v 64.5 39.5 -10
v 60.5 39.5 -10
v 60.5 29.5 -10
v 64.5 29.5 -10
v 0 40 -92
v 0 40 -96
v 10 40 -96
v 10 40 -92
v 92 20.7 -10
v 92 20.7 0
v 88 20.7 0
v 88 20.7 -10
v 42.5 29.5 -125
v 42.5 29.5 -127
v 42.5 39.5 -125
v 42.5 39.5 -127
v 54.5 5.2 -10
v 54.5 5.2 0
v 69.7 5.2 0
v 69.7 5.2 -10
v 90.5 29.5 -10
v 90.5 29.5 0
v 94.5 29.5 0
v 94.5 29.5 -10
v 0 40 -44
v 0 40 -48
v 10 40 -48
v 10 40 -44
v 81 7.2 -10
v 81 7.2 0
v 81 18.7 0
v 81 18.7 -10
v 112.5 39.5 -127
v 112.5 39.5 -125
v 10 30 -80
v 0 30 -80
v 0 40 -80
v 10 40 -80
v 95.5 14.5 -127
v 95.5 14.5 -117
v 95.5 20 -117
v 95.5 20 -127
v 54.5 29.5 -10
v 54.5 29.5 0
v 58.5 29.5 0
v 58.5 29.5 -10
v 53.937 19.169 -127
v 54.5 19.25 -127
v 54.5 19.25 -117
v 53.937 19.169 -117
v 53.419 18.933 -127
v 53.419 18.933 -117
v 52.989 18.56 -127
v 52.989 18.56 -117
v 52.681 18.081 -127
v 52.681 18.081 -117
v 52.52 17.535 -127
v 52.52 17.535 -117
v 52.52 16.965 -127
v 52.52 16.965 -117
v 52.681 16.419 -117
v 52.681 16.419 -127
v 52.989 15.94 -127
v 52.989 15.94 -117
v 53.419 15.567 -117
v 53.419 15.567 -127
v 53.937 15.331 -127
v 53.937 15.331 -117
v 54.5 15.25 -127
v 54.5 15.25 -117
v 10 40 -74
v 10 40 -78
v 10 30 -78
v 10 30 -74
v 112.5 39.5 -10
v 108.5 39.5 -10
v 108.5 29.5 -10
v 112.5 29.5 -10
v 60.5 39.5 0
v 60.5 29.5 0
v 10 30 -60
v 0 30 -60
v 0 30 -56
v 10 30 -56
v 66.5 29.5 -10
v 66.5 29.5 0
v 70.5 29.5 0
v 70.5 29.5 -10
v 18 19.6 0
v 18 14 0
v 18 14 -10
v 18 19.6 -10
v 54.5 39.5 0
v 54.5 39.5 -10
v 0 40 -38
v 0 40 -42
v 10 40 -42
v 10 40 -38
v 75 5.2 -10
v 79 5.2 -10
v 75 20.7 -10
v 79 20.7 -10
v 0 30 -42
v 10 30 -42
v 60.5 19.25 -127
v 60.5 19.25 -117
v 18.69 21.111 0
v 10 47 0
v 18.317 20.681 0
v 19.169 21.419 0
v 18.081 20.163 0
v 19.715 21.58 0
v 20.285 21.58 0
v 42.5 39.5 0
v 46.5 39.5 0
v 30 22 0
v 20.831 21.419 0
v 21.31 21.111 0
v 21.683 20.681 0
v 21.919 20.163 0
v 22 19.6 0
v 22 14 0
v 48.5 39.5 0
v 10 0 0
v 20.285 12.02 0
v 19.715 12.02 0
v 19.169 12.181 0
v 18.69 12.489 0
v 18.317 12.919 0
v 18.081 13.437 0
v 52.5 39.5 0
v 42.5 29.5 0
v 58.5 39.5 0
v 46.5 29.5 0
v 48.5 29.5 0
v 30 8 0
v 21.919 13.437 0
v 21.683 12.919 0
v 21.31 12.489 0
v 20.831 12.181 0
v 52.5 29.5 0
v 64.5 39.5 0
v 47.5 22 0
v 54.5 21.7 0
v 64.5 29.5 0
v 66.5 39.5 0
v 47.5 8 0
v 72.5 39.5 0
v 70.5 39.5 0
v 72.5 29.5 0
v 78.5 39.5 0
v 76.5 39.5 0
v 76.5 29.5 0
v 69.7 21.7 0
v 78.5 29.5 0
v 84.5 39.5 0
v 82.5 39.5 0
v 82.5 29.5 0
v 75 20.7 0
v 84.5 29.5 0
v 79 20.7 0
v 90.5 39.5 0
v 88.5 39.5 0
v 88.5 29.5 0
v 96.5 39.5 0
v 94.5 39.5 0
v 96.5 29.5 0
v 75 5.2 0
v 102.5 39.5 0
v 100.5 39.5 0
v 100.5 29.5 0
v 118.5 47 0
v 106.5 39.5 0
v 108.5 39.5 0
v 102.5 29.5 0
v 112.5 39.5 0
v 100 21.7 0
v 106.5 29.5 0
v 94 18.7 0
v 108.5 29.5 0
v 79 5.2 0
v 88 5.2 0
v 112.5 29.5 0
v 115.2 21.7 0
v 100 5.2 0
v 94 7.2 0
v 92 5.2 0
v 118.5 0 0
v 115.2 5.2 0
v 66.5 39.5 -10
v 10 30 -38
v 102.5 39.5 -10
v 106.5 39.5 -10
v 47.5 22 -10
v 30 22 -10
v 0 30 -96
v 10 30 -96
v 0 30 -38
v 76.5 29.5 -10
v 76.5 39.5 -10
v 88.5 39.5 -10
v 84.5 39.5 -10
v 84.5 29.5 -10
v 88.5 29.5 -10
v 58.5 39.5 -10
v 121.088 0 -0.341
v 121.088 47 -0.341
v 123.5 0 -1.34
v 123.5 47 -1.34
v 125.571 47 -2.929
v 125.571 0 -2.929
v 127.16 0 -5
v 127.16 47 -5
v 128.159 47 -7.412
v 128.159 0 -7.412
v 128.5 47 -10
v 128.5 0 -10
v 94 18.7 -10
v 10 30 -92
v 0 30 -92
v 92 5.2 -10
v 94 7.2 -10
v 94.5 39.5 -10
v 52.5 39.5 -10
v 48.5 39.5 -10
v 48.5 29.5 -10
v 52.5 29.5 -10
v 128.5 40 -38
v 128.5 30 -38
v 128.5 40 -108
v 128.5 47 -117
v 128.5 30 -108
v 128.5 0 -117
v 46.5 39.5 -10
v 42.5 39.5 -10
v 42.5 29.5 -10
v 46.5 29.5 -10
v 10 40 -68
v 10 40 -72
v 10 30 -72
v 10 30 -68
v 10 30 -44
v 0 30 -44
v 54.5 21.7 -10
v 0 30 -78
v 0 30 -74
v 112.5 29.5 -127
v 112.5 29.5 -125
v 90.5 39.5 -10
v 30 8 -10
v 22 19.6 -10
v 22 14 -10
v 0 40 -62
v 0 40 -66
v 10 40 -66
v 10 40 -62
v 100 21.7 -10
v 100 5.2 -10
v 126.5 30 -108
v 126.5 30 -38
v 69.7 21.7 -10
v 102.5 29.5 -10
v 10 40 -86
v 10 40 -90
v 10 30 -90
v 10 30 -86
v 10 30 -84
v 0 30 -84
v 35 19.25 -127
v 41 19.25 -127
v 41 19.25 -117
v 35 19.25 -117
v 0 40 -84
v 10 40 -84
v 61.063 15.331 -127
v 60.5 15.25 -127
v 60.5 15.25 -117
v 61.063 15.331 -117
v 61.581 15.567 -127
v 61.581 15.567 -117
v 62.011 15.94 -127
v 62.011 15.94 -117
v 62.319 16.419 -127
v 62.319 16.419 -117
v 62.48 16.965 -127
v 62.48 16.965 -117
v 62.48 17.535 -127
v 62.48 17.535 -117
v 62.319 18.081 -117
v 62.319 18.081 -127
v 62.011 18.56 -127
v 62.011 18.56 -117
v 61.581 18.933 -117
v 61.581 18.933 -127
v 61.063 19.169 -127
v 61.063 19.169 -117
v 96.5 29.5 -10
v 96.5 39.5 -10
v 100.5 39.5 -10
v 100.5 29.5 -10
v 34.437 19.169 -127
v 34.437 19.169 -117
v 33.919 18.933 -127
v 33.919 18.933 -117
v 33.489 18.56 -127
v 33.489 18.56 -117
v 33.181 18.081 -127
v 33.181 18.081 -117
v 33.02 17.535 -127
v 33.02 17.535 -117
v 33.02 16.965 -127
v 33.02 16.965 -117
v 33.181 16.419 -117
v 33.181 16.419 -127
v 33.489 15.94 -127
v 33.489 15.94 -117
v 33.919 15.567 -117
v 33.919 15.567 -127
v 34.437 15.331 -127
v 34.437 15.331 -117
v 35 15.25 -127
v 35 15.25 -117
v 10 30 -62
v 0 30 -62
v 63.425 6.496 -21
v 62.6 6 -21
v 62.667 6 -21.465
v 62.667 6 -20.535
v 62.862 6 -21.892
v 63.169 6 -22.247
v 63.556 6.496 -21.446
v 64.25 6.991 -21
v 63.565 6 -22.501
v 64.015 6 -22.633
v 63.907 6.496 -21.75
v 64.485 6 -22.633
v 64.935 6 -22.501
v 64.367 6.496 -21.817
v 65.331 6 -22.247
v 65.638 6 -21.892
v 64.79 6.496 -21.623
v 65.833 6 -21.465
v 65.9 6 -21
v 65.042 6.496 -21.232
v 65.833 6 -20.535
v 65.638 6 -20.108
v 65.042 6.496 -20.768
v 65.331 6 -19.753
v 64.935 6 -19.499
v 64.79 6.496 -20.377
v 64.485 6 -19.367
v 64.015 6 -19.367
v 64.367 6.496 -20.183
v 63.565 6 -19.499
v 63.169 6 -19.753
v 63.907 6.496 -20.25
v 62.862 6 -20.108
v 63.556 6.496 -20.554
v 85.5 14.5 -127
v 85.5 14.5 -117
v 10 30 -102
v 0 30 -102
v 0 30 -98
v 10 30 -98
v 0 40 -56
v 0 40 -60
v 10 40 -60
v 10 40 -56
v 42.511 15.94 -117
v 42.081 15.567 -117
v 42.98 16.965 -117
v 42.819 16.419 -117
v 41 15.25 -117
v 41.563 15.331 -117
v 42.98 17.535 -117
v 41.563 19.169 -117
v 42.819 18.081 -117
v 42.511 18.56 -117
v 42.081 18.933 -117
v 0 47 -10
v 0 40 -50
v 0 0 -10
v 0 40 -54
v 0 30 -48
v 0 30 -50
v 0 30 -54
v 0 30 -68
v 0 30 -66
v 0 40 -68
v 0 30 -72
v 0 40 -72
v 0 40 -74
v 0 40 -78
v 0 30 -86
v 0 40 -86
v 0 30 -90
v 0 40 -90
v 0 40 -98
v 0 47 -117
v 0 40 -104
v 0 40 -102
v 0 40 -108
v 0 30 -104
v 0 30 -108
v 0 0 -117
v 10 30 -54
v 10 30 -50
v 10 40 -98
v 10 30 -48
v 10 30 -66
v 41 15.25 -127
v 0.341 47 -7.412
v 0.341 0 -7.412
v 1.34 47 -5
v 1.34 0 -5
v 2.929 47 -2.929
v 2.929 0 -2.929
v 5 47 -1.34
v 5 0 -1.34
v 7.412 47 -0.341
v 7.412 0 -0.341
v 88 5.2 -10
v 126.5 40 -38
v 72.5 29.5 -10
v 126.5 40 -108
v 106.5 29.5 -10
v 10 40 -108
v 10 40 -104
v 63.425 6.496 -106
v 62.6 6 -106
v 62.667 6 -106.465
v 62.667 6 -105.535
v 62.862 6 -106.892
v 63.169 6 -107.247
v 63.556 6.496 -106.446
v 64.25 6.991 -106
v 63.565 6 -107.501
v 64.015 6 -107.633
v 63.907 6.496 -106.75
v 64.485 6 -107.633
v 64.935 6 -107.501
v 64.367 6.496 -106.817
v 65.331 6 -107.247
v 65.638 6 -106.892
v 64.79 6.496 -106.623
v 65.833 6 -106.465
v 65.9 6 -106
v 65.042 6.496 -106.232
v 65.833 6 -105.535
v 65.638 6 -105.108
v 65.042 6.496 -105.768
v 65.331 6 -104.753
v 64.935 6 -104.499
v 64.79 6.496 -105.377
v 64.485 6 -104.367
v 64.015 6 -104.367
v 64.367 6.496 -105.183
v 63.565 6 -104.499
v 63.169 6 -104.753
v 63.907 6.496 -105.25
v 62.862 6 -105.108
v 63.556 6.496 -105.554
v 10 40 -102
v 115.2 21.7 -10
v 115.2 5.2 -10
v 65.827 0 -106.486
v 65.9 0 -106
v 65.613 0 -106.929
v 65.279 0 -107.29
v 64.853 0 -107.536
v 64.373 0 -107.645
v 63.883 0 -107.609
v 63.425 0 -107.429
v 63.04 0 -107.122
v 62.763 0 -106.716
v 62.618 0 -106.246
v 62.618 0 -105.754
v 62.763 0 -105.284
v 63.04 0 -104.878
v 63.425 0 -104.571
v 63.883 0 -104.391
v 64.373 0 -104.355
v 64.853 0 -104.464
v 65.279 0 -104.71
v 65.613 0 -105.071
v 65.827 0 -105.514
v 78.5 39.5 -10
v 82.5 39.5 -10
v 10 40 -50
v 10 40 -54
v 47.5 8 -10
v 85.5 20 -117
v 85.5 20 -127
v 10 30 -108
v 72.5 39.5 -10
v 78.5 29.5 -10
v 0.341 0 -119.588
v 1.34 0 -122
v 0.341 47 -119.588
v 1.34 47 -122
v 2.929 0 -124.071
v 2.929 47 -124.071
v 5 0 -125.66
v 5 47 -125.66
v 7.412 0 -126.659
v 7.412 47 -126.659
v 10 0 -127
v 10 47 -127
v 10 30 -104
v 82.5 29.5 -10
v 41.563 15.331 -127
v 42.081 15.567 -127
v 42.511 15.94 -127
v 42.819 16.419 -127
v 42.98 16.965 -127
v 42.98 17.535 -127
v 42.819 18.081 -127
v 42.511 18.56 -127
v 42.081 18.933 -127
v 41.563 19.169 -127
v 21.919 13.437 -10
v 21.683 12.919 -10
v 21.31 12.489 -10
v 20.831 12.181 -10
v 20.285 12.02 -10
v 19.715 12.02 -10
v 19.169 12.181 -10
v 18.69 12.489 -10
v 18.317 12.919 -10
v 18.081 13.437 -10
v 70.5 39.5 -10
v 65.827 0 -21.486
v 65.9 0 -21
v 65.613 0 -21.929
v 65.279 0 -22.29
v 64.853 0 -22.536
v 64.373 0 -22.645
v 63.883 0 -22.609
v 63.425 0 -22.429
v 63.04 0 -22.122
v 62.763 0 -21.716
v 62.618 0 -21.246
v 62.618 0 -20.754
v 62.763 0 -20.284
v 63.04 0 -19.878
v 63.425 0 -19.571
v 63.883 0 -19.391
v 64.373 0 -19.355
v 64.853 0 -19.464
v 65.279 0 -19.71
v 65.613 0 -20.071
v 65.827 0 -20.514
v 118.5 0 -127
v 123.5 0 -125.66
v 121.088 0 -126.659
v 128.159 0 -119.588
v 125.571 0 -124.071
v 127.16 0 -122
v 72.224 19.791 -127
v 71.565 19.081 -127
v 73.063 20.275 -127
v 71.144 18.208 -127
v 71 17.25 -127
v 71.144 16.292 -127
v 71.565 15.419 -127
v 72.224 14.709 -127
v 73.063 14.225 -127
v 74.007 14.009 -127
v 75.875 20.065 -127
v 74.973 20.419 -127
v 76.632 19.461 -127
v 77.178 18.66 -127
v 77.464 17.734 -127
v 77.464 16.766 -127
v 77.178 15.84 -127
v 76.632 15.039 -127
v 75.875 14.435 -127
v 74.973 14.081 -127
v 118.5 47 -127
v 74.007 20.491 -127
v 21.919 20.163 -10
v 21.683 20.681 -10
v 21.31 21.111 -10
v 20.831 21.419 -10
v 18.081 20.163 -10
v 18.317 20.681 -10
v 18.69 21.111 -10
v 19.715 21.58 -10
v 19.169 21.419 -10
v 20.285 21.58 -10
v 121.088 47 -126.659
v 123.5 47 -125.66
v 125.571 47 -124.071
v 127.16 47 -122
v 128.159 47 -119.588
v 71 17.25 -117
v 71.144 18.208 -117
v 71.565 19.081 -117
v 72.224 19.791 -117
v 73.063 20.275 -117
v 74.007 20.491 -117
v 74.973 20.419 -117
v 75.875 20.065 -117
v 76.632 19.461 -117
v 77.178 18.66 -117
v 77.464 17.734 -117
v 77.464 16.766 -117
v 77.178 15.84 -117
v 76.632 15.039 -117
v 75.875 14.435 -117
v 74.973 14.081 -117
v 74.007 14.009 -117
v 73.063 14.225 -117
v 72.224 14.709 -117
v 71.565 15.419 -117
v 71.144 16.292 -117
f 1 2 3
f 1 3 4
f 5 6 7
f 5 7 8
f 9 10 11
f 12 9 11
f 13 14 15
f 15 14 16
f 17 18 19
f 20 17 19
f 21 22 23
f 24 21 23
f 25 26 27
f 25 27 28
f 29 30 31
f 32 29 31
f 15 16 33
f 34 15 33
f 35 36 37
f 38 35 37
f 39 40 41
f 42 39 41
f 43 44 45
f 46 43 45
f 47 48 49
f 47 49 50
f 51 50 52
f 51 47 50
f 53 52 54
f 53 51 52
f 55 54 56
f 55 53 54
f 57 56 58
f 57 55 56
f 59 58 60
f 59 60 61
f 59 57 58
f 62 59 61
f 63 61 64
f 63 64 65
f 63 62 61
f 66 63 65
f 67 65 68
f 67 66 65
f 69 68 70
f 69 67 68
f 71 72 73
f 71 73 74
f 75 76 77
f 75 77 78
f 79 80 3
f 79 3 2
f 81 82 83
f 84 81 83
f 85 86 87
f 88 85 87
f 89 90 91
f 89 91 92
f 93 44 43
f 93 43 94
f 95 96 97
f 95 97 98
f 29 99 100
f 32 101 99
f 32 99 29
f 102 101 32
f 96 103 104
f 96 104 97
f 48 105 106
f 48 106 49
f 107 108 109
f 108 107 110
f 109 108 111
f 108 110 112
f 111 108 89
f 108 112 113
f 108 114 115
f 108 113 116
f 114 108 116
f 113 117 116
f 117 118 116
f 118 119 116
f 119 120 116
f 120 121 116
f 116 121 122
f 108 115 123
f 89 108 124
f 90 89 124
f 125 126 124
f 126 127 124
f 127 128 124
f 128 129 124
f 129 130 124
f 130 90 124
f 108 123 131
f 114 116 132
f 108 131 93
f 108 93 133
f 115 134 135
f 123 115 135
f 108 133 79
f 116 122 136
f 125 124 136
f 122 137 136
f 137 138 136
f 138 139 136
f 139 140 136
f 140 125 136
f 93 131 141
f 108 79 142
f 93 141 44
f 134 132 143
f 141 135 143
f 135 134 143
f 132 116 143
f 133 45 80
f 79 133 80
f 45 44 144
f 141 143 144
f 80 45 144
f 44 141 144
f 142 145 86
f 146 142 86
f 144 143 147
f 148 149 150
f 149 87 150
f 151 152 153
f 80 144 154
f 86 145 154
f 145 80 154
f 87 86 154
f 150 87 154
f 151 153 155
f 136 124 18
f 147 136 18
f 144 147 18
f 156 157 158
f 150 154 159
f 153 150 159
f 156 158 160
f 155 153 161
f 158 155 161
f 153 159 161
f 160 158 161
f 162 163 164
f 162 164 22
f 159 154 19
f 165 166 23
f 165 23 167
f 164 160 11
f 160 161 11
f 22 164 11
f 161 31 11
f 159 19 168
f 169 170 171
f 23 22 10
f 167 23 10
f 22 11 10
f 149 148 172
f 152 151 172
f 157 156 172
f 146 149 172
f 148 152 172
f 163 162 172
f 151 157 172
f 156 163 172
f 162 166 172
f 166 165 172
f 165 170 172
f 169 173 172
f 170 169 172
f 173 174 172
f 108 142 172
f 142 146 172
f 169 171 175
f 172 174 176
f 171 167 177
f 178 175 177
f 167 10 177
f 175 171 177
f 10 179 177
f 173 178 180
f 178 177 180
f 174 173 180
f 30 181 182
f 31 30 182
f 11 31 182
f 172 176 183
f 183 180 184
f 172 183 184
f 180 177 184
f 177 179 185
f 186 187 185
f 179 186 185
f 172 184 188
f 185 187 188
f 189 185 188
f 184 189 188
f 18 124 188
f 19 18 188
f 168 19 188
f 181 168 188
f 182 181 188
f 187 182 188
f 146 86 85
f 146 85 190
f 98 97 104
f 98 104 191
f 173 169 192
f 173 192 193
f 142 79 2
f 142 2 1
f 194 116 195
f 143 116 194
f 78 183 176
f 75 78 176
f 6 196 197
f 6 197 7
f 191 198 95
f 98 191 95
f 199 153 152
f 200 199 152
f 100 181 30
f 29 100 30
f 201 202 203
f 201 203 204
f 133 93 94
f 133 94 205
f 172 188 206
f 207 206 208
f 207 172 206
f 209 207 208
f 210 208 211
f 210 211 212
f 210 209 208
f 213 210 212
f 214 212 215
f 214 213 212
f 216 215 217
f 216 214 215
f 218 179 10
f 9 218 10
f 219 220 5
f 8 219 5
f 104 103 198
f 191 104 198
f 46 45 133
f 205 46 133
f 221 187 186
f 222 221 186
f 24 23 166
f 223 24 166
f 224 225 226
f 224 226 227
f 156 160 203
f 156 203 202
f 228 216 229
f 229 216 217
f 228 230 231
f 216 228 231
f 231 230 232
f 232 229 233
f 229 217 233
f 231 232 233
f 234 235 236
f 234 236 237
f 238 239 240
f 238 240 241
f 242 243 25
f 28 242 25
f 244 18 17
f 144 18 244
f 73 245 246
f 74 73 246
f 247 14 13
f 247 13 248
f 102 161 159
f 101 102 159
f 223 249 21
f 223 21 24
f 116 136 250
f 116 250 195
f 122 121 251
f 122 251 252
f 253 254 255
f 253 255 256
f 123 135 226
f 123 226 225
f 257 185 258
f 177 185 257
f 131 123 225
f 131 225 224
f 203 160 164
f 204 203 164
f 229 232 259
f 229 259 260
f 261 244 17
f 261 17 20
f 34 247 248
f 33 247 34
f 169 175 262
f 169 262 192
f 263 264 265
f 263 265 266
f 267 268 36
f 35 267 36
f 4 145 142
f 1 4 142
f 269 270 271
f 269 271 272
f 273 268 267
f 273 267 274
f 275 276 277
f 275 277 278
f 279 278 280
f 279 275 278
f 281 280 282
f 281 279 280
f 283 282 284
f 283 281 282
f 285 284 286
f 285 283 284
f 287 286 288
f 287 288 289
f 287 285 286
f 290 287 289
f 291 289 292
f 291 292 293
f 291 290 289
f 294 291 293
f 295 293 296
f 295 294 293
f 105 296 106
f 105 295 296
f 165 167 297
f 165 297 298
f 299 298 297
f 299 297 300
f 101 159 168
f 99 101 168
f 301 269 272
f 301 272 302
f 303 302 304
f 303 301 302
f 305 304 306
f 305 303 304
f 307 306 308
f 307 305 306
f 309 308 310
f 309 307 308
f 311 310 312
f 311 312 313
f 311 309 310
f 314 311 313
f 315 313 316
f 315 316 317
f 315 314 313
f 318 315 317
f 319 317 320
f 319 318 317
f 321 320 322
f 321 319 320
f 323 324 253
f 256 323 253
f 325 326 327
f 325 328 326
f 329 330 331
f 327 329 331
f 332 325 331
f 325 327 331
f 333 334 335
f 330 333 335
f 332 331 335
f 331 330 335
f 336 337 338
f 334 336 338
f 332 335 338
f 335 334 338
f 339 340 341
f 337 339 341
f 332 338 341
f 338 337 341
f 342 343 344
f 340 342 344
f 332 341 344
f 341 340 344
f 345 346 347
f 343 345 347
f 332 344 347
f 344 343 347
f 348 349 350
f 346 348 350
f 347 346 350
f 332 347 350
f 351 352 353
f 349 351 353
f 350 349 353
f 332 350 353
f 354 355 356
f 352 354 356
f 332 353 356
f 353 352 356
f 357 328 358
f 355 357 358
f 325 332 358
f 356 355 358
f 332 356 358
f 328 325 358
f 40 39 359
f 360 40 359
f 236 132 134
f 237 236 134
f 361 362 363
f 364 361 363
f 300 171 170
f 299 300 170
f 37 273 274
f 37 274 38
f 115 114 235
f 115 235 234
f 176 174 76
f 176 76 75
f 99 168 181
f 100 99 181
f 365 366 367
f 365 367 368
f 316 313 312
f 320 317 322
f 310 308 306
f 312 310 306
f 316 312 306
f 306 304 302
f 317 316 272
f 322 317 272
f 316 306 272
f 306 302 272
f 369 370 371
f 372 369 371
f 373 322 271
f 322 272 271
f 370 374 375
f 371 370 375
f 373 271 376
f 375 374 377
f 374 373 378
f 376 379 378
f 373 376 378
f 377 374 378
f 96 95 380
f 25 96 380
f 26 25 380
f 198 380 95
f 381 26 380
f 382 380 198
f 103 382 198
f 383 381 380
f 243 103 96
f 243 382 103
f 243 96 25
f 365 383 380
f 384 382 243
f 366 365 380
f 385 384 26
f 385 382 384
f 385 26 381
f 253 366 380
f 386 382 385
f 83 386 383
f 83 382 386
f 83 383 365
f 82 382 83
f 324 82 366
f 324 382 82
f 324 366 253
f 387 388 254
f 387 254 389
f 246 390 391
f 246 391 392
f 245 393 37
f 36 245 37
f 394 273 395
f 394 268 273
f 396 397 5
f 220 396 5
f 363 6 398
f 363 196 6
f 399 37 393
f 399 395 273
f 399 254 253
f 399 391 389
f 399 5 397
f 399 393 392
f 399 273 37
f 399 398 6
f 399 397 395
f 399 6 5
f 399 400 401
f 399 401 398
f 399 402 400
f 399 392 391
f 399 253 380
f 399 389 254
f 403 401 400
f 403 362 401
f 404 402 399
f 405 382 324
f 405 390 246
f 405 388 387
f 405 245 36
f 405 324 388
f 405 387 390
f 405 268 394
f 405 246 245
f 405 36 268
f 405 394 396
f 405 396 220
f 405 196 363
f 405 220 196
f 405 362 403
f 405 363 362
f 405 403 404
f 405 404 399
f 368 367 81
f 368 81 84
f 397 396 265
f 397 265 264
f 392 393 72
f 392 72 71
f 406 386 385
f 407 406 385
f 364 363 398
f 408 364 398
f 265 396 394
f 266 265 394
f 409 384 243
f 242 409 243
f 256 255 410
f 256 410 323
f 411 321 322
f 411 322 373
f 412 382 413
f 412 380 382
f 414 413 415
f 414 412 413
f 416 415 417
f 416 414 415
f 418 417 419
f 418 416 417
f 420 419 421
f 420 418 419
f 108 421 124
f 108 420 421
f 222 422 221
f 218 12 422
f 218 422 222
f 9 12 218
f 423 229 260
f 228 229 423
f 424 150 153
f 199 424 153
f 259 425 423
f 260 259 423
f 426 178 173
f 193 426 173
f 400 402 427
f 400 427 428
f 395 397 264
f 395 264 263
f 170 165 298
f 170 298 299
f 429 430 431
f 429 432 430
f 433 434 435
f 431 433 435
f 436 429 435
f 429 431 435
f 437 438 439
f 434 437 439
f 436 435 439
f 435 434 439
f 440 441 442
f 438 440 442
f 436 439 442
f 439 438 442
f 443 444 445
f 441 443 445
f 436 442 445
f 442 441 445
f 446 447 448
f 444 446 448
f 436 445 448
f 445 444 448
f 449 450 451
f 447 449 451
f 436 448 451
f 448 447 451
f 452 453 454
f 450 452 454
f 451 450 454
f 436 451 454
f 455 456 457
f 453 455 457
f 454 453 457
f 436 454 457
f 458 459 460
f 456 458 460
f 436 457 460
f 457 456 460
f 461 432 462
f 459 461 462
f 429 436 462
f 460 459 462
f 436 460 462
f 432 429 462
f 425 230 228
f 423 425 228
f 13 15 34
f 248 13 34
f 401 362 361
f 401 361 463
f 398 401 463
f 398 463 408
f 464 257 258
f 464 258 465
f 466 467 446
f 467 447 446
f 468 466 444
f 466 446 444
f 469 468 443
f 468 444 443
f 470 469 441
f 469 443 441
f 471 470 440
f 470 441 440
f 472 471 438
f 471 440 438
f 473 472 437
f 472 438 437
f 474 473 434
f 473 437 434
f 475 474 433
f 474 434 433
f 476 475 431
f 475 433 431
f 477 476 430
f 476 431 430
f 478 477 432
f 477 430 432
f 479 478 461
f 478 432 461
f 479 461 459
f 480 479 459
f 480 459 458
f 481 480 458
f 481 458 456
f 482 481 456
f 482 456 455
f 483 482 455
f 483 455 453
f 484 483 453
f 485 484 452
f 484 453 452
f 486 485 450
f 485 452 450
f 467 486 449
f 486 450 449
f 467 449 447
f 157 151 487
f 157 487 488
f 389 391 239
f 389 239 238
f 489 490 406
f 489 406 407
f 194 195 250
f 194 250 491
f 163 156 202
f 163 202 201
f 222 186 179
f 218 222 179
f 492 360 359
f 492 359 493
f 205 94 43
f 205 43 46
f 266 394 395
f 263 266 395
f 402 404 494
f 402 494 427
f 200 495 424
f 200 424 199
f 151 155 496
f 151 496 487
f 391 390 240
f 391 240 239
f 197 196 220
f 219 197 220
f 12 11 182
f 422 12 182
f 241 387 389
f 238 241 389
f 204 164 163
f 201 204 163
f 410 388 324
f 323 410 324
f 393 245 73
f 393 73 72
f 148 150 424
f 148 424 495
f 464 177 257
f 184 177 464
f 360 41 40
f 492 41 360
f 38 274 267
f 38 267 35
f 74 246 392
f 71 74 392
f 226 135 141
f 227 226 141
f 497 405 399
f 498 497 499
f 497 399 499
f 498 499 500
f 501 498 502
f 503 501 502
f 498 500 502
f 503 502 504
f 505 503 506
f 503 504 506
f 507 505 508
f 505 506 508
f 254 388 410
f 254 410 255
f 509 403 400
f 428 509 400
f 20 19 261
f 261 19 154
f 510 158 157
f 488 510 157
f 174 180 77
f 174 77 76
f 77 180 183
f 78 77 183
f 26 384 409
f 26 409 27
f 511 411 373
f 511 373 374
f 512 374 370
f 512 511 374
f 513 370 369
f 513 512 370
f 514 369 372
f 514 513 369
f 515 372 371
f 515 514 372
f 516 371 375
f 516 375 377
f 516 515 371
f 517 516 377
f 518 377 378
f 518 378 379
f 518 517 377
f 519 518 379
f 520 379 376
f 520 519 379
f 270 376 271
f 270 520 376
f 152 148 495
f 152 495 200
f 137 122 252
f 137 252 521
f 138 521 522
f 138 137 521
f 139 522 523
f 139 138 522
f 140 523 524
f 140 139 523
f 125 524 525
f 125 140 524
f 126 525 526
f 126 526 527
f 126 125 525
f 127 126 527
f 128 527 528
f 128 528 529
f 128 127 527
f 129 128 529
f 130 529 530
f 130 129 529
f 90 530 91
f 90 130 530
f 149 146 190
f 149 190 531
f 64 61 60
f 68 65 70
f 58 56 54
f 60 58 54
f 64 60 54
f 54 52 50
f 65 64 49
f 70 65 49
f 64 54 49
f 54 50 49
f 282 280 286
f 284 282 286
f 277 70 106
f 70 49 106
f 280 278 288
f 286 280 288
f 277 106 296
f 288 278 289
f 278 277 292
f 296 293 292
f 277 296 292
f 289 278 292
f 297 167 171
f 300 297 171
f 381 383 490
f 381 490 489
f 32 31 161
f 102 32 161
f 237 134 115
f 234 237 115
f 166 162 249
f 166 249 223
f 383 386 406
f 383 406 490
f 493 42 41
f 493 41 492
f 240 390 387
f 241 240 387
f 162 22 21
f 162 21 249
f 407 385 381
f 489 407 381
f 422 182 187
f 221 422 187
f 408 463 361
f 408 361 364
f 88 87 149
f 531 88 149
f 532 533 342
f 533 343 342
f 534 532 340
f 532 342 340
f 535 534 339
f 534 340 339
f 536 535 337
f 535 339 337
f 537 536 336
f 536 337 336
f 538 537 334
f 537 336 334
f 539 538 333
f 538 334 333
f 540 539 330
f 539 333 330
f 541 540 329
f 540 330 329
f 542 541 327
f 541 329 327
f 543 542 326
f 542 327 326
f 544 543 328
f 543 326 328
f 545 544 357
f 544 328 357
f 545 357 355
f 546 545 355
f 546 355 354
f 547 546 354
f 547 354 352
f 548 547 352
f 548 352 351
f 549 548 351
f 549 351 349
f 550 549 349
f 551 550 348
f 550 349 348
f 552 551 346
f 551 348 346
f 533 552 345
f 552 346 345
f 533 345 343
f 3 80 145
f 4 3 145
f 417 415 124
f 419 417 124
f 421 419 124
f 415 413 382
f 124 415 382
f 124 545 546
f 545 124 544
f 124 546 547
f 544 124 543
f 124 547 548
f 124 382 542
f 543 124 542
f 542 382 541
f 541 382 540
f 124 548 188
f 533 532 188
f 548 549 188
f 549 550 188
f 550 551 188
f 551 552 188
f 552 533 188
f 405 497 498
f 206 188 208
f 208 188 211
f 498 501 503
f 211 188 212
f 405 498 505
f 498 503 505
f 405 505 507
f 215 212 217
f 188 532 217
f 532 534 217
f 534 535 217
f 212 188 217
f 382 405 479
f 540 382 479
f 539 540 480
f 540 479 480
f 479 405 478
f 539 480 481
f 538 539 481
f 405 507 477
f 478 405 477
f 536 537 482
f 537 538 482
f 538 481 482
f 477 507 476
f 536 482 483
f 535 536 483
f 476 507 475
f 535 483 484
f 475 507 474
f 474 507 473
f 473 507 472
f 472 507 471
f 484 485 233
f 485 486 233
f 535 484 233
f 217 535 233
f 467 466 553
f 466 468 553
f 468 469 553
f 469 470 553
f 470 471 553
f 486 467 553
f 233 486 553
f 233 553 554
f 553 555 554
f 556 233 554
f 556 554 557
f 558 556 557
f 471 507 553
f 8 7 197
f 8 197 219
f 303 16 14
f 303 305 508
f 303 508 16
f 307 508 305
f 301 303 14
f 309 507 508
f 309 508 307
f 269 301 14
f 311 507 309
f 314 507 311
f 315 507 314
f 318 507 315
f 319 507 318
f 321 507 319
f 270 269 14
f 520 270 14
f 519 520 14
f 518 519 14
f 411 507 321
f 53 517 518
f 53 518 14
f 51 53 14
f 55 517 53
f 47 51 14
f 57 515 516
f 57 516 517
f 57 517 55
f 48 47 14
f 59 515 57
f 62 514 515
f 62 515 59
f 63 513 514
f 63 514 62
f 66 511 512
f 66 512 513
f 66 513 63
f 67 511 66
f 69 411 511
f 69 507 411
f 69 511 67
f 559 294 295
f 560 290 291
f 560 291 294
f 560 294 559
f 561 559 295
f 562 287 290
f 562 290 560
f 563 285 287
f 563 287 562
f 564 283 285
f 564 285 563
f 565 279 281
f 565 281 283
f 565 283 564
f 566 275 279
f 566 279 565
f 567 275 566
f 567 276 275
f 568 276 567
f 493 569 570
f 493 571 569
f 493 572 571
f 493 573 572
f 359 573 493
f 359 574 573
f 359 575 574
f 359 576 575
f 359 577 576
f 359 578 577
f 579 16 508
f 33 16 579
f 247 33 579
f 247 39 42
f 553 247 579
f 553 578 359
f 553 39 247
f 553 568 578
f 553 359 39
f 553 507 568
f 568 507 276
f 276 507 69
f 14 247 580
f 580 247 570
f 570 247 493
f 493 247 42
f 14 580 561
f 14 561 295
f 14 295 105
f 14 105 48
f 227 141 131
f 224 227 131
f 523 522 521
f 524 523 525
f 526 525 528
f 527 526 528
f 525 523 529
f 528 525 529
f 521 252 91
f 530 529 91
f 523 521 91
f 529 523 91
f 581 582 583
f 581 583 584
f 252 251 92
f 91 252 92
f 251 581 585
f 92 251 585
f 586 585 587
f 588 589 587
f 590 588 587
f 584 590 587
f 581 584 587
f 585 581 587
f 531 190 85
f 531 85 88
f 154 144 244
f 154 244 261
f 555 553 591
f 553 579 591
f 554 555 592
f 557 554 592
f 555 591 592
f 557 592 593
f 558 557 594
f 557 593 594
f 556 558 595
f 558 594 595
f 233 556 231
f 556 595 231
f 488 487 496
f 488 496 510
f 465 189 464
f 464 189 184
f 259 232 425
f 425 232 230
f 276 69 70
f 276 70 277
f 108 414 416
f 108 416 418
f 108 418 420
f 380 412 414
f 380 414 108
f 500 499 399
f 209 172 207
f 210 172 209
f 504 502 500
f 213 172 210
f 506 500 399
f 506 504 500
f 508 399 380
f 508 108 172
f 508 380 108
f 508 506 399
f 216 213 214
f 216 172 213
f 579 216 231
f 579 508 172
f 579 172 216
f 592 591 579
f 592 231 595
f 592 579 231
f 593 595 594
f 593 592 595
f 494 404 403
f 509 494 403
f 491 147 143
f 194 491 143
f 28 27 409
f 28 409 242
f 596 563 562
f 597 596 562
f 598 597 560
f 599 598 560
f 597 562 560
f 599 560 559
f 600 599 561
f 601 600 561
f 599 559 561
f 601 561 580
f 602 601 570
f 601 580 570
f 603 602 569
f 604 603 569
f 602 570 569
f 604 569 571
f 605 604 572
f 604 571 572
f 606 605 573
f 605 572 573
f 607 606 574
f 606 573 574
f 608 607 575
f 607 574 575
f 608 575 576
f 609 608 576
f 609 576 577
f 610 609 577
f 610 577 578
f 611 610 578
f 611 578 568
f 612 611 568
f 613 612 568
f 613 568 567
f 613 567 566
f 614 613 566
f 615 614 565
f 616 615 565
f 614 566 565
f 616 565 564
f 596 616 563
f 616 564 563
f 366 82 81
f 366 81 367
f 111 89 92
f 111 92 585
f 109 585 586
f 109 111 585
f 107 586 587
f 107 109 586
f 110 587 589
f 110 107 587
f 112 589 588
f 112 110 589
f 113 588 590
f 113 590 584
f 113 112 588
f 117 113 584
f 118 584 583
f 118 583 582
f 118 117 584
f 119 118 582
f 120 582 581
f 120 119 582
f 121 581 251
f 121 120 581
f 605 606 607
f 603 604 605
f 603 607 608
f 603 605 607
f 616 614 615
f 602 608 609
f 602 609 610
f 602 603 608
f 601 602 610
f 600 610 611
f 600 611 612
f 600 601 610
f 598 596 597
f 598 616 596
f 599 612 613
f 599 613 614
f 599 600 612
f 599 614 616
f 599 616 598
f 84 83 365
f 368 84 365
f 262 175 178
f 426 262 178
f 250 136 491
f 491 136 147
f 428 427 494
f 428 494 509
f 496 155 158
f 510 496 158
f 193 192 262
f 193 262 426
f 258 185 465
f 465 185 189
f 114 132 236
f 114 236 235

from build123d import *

# Parameters (mm, degrees)
SKETCH1_W                                     = 128.5
SKETCH1_H                                     = 127
GABARYT_DEPTH                                 = 47
SKETCH2_W                                     = 17.5
SKETCH2_H                                     = 14
SKETCH2_W_2                                   = 15.2
SKETCH2_H_2                                   = 16.5
PORTY_USBC_ETHERNET_2XUSBA_HDMI_HDMI_2X_DEPTH = 10
SKETCH3_W                                     = 4
SKETCH3_H                                     = 10
VENTS_OUTLET_1_DEPTH                          = 10
SKETCH4_W                                     = 4
SKETCH4_H                                     = 10
VENTS_OUTLET_2_DEPTH                          = 10
VENTS_START                                   = -127
SKETCH3_3_W                                   = 70
SKETCH3_3_H                                   = 10
VENTS_INLET_1_DEPTH                           = 2
VENTS_START_2                                 = -128.5
SKETCH4_3_W                                   = 70
SKETCH4_3_H                                   = 10
VENTS_INLET_2_DEPTH                           = 2
SKETCH5_R                                     = 3.25
SKETCH5_W                                     = 10
SKETCH5_H                                     = 5.5
PORTY_ON_AUDIOJACK_USBC_USBC_DEPTH            = 10
TAP_DRILL_FOR_M4_TAP1_D                       = 3.3
TAP_DRILL_FOR_M4_TAP1_DEPTH                   = 6
TAP_DRILL_FOR_M4_TAP1_TIP                     = 0.991420021
FILLET1_R                                     = 10


with BuildPart() as part:
    # Sketch1 → gabaryt (new body)
    with BuildSketch(Plane(origin=(0, 0, 0), x_dir=(1, 0, 0), z_dir=(0, 1, 0))):
        with Locations((64.25, 63.5)):
            Rectangle(SKETCH1_W, SKETCH1_H)
    extrude(amount=GABARYT_DEPTH)

    # Sketch2 → porty (usbc/ethernet/2xUSBa/hdmi/hdmi/2xUSBa) (cut)
    with BuildSketch(Plane.XY):
        with BuildLine():
            Line((22, 19.6), (22, 14))
            ThreePointArc((22, 14), (20, 12), (18, 14))
            Line((18, 14), (18, 19.6))
            ThreePointArc((18, 19.6), (20, 21.6), (22, 19.6))
        make_face()
        Polygon((75, 20.7), (75, 5.2), (79, 5.2), (81, 7.2), (81, 18.7), (79, 20.7), align=None)
        with Locations((38.75, 15)):
            Rectangle(SKETCH2_W, SKETCH2_H)
        with Locations((62.1, 13.45)):
            Rectangle(SKETCH2_W_2, SKETCH2_H_2)
        Polygon((88, 20.7), (88, 5.2), (92, 5.2), (94, 7.2), (94, 18.7), (92, 20.7), align=None)
        with Locations((107.6, 13.45)):
            Rectangle(SKETCH2_W_2, SKETCH2_H_2)
    extrude(amount=-PORTY_USBC_ETHERNET_2XUSBA_HDMI_HDMI_2X_DEPTH, mode=Mode.SUBTRACT)

    # Sketch3 → vents outlet 1 (cut)
    with BuildSketch(Plane.XY):
        with Locations((44.5, 34.5)):
            Rectangle(SKETCH3_W, SKETCH3_H)
        with Locations((50.5, 34.5)):
            Rectangle(SKETCH3_W, SKETCH3_H)
        with Locations((56.5, 34.5)):
            Rectangle(SKETCH3_W, SKETCH3_H)
        with Locations((62.5, 34.5)):
            Rectangle(SKETCH3_W, SKETCH3_H)
        with Locations((68.5, 34.5)):
            Rectangle(SKETCH3_W, SKETCH3_H)
        with Locations((74.5, 34.5)):
            Rectangle(SKETCH3_W, SKETCH3_H)
        with Locations((80.5, 34.5)):
            Rectangle(SKETCH3_W, SKETCH3_H)
        with Locations((86.5, 34.5)):
            Rectangle(SKETCH3_W, SKETCH3_H)
        with Locations((92.5, 34.5)):
            Rectangle(SKETCH3_W, SKETCH3_H)
        with Locations((98.5, 34.5)):
            Rectangle(SKETCH3_W, SKETCH3_H)
        with Locations((104.5, 34.5)):
            Rectangle(SKETCH3_W, SKETCH3_H)
        with Locations((110.5, 34.5)):
            Rectangle(SKETCH3_W, SKETCH3_H)
    extrude(amount=-VENTS_OUTLET_1_DEPTH, mode=Mode.SUBTRACT)

    # Sketch4 → vents outlet 2 (cut)
    with BuildSketch(Plane.ZY):
        with Locations((-106, 35)):
            Rectangle(SKETCH4_W, SKETCH4_H)
        with Locations((-100, 35)):
            Rectangle(SKETCH4_W, SKETCH4_H)
        with Locations((-94, 35)):
            Rectangle(SKETCH4_W, SKETCH4_H)
        with Locations((-88, 35)):
            Rectangle(SKETCH4_W, SKETCH4_H)
        with Locations((-82, 35)):
            Rectangle(SKETCH4_W, SKETCH4_H)
        with Locations((-76, 35)):
            Rectangle(SKETCH4_W, SKETCH4_H)
        with Locations((-70, 35)):
            Rectangle(SKETCH4_W, SKETCH4_H)
        with Locations((-64, 35)):
            Rectangle(SKETCH4_W, SKETCH4_H)
        with Locations((-58, 35)):
            Rectangle(SKETCH4_W, SKETCH4_H)
        with Locations((-52, 35)):
            Rectangle(SKETCH4_W, SKETCH4_H)
        with Locations((-46, 35)):
            Rectangle(SKETCH4_W, SKETCH4_H)
        with Locations((-40, 35)):
            Rectangle(SKETCH4_W, SKETCH4_H)
    extrude(amount=-VENTS_OUTLET_2_DEPTH, mode=Mode.SUBTRACT)

    # Sketch3<3> → vents inlet 1 (cut)
    with BuildSketch(Plane.XY.offset(VENTS_START)):
        with Locations((77.5, 34.5)):
            Rectangle(SKETCH3_3_W, SKETCH3_3_H)
    extrude(amount=VENTS_INLET_1_DEPTH, mode=Mode.SUBTRACT)

    # Sketch4<3> → vents inlet 2 (cut)
    with BuildSketch(Plane.ZY.offset(VENTS_START_2)):
        with Locations((-73, 35)):
            Rectangle(SKETCH4_3_W, SKETCH4_3_H)
    extrude(amount=VENTS_INLET_2_DEPTH, mode=Mode.SUBTRACT)

    # Sketch5 → porty (on/audiojack/USBc/USBc) (cut)
    with BuildSketch(Plane(origin=(0, 0, -127), x_dir=(-1, 0, 0), z_dir=(0, 0, -1))):
        with Locations((-74.25, 17.25)):
            Circle(SKETCH5_R)
        with Locations((-90.5, 17.25)):
            Rectangle(SKETCH5_W, SKETCH5_H)
        with BuildLine():
            Line((-60.5, 19.25), (-54.5, 19.25))
            ThreePointArc((-54.5, 19.25), (-52.5, 17.25), (-54.5, 15.25))
            Line((-54.5, 15.25), (-60.5, 15.25))
            ThreePointArc((-60.5, 15.25), (-62.5, 17.25), (-60.5, 19.25))
        make_face()
        with BuildLine():
            Line((-41, 19.25), (-35, 19.25))
            ThreePointArc((-35, 19.25), (-33, 17.25), (-35, 15.25))
            Line((-35, 15.25), (-41, 15.25))
            ThreePointArc((-41, 15.25), (-43, 17.25), (-41, 19.25))
        make_face()
    extrude(amount=-PORTY_ON_AUDIOJACK_USBC_USBC_DEPTH, mode=Mode.SUBTRACT)

    # Tap Drill for M4 Tap1
    with Locations(Plane(origin=(0, 0, 0), x_dir=(-1, 0, 0), z_dir=(0, -1, 0))):
        with Locations((-64.25, 106), (-64.25, 21)):
            Hole(TAP_DRILL_FOR_M4_TAP1_D / 2, depth=TAP_DRILL_FOR_M4_TAP1_DEPTH)
            with Locations((0, 0, -(TAP_DRILL_FOR_M4_TAP1_DEPTH + TAP_DRILL_FOR_M4_TAP1_TIP / 2))):  # 118° drill point
                Cone(0, TAP_DRILL_FOR_M4_TAP1_D / 2, TAP_DRILL_FOR_M4_TAP1_TIP, mode=Mode.SUBTRACT)

    # Fillet1
    fillet1_edges = [part.edges().sort_by_distance(p)[0] for p in [
        (0, 23.5, -127),
        (128.5, 23.5, -127),
        (128.5, 23.5, 0),
        (0, 23.5, 0),
    ]]
    fillet(fillet1_edges, radius=FILLET1_R)


solid = part.part
